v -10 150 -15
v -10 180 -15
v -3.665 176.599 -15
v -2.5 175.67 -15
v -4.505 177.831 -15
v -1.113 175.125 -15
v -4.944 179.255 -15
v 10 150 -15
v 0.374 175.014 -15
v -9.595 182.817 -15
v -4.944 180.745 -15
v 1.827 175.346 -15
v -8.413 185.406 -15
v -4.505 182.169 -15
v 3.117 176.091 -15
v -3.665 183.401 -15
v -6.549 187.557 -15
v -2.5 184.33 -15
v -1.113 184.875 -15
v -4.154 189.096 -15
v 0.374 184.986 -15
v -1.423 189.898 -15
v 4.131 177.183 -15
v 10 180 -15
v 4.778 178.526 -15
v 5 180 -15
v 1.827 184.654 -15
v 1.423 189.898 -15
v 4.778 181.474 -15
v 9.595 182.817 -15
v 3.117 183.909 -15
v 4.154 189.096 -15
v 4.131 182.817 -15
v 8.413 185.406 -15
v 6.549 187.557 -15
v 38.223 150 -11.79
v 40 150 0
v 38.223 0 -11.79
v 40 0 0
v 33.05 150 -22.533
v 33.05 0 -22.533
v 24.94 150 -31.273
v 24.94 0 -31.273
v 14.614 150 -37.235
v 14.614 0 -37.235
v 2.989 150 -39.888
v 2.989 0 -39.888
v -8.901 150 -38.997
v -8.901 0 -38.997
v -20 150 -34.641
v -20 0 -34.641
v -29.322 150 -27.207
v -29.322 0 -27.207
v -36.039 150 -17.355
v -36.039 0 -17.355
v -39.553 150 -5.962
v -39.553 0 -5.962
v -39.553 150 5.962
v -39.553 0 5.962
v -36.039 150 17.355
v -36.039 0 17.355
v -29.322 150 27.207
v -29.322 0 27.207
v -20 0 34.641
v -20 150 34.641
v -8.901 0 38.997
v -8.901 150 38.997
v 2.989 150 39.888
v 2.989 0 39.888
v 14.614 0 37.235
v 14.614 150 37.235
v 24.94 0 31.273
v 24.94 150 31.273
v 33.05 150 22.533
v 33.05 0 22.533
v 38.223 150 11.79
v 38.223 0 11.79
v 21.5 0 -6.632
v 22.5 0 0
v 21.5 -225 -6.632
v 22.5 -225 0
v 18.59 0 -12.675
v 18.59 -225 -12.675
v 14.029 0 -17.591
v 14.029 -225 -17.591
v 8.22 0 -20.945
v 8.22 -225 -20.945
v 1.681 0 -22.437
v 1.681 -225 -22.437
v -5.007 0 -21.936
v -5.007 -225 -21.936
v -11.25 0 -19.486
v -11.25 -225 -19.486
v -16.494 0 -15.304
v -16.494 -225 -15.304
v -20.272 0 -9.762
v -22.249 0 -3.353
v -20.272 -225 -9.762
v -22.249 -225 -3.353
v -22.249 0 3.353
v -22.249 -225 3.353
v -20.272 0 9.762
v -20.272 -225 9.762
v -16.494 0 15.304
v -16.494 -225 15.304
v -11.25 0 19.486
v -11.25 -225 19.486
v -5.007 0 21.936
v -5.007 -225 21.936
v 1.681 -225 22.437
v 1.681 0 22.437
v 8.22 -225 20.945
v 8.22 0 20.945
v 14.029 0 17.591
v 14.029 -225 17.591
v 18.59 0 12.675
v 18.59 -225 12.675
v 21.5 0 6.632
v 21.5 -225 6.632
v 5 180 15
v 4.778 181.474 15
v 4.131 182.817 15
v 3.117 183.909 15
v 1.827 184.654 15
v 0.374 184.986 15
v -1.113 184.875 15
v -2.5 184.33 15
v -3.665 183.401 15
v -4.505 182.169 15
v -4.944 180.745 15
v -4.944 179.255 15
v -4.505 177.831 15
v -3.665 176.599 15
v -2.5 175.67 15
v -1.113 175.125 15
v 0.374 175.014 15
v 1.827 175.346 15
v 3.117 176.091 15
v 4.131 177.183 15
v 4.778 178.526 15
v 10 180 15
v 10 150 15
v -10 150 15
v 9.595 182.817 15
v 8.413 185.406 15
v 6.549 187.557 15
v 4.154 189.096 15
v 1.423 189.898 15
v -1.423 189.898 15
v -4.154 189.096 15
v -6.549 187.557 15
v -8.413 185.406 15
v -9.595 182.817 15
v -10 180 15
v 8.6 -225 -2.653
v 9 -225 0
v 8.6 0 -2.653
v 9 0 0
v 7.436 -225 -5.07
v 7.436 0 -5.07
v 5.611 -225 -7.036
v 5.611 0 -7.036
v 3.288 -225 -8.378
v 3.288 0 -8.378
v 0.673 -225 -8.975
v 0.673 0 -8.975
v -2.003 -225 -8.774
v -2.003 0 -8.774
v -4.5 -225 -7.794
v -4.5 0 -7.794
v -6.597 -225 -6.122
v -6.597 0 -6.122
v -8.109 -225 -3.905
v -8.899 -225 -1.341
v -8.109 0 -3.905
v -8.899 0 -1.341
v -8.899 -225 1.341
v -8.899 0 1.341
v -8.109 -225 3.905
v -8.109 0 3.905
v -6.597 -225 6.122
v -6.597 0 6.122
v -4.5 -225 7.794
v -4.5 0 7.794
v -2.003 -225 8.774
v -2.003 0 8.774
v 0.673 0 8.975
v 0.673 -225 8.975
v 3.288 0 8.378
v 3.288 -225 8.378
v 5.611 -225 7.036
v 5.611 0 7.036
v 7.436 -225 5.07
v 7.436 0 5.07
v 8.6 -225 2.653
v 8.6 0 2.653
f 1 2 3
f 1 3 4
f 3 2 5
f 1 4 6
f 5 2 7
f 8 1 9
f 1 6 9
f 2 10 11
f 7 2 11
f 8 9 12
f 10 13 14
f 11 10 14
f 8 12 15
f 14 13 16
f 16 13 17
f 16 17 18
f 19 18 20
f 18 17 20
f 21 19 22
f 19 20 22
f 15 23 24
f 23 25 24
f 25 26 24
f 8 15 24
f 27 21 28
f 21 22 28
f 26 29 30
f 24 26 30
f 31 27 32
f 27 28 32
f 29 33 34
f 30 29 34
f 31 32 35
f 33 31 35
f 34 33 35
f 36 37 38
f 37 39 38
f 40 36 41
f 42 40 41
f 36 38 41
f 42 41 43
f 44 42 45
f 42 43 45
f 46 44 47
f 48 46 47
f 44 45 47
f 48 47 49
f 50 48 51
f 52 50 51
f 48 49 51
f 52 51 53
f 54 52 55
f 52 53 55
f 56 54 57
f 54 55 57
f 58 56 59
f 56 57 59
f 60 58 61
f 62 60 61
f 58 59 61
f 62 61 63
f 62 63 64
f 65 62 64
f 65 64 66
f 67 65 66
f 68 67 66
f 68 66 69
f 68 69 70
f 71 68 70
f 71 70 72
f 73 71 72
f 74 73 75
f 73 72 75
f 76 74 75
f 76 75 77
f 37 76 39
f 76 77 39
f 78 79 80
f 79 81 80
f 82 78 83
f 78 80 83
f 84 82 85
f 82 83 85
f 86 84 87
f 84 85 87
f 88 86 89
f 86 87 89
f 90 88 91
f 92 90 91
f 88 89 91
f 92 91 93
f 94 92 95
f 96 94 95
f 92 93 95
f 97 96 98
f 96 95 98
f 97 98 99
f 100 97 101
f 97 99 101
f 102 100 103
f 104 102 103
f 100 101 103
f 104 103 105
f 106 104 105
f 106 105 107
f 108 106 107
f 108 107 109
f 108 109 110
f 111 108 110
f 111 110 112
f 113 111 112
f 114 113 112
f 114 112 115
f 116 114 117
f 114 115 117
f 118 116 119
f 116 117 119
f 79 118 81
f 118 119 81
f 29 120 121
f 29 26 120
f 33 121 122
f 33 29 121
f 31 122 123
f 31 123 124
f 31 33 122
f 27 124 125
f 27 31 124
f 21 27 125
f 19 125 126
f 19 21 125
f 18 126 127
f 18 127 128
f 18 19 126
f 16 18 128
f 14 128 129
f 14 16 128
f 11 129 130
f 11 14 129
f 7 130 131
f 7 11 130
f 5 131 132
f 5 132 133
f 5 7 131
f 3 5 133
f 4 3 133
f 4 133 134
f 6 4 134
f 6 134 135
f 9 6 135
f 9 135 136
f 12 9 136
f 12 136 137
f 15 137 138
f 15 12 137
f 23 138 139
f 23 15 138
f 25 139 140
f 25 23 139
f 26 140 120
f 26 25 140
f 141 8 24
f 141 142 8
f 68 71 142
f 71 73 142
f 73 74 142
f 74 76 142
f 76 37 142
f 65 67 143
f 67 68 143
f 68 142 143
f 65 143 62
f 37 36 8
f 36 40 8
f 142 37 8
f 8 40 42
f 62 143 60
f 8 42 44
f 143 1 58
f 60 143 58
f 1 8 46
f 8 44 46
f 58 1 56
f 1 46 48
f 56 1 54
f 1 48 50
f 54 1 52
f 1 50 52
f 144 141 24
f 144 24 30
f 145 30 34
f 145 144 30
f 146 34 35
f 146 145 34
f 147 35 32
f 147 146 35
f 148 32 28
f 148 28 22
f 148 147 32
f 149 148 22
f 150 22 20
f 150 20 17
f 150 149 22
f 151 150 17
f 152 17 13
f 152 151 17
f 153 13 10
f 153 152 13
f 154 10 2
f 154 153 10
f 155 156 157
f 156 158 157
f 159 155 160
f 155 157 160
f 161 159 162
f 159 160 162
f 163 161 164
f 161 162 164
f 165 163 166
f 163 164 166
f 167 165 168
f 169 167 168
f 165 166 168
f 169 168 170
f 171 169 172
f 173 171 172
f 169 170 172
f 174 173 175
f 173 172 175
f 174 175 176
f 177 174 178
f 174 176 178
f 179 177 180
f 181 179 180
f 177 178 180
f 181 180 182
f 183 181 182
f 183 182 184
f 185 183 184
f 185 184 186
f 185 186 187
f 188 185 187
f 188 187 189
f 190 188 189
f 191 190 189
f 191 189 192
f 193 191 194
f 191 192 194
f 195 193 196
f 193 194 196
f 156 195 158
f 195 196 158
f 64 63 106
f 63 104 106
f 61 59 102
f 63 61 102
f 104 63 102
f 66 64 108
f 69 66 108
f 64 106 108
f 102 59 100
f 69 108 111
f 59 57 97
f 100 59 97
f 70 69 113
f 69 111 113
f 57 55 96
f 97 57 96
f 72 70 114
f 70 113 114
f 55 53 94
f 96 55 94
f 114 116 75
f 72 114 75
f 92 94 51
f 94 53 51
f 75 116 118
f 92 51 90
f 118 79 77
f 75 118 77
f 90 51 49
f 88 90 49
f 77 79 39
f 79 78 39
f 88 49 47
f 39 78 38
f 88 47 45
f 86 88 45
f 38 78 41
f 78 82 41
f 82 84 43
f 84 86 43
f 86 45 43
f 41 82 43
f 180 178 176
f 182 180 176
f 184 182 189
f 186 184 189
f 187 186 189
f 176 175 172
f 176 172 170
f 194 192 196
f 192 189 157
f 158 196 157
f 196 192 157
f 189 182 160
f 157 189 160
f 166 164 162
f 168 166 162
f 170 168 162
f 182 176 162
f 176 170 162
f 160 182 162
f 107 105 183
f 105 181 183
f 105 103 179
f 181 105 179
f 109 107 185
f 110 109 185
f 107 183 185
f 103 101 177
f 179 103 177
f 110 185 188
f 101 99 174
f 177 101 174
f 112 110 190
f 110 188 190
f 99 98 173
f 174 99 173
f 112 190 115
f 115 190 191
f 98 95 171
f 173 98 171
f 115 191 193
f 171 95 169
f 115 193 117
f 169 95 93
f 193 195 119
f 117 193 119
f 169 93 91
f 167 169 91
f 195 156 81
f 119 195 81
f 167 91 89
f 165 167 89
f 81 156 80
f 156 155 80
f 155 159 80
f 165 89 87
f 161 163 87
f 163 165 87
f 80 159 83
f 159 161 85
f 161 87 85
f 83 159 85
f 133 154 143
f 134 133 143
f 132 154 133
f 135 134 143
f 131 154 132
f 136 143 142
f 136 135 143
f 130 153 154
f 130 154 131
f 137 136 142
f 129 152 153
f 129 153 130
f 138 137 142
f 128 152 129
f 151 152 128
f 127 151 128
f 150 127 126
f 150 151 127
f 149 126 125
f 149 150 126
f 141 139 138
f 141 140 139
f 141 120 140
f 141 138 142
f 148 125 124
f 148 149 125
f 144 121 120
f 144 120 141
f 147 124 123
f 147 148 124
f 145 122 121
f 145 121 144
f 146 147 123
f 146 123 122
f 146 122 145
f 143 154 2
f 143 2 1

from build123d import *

# Parameters (mm, degrees)
ESBO_O2_R                = 5
RESSALTO_EXTRUS_O1_DEPTH = 15


with BuildPart() as part:
    # Esboço1 → Revolução1 (revolve)
    with BuildSketch(Plane.XY):
        Polygon((0, 150), (40, 150), (40, 0), (22.5, 0), (22.5, -225), (9, -225), (9, 0), (0, 0), align=None)
    revolve(axis=Axis((0, 0, 0), (0, 1, 0)))

    # Esboço2 → Ressalto-extrusão1 (add, symmetric)
    with BuildSketch(Plane.XY):
        with BuildLine():
            Line((10, 150), (10, 180))
            ThreePointArc((10, 180), (0, 190), (-10, 180))
            Line((-10, 180), (-10, 150))
            Line((-10, 150), (10, 150))
        make_face()
        with Locations((0, 180)):
            Circle(ESBO_O2_R, mode=Mode.SUBTRACT)
    extrude(amount=RESSALTO_EXTRUS_O1_DEPTH, both=True)


solid = part.part
